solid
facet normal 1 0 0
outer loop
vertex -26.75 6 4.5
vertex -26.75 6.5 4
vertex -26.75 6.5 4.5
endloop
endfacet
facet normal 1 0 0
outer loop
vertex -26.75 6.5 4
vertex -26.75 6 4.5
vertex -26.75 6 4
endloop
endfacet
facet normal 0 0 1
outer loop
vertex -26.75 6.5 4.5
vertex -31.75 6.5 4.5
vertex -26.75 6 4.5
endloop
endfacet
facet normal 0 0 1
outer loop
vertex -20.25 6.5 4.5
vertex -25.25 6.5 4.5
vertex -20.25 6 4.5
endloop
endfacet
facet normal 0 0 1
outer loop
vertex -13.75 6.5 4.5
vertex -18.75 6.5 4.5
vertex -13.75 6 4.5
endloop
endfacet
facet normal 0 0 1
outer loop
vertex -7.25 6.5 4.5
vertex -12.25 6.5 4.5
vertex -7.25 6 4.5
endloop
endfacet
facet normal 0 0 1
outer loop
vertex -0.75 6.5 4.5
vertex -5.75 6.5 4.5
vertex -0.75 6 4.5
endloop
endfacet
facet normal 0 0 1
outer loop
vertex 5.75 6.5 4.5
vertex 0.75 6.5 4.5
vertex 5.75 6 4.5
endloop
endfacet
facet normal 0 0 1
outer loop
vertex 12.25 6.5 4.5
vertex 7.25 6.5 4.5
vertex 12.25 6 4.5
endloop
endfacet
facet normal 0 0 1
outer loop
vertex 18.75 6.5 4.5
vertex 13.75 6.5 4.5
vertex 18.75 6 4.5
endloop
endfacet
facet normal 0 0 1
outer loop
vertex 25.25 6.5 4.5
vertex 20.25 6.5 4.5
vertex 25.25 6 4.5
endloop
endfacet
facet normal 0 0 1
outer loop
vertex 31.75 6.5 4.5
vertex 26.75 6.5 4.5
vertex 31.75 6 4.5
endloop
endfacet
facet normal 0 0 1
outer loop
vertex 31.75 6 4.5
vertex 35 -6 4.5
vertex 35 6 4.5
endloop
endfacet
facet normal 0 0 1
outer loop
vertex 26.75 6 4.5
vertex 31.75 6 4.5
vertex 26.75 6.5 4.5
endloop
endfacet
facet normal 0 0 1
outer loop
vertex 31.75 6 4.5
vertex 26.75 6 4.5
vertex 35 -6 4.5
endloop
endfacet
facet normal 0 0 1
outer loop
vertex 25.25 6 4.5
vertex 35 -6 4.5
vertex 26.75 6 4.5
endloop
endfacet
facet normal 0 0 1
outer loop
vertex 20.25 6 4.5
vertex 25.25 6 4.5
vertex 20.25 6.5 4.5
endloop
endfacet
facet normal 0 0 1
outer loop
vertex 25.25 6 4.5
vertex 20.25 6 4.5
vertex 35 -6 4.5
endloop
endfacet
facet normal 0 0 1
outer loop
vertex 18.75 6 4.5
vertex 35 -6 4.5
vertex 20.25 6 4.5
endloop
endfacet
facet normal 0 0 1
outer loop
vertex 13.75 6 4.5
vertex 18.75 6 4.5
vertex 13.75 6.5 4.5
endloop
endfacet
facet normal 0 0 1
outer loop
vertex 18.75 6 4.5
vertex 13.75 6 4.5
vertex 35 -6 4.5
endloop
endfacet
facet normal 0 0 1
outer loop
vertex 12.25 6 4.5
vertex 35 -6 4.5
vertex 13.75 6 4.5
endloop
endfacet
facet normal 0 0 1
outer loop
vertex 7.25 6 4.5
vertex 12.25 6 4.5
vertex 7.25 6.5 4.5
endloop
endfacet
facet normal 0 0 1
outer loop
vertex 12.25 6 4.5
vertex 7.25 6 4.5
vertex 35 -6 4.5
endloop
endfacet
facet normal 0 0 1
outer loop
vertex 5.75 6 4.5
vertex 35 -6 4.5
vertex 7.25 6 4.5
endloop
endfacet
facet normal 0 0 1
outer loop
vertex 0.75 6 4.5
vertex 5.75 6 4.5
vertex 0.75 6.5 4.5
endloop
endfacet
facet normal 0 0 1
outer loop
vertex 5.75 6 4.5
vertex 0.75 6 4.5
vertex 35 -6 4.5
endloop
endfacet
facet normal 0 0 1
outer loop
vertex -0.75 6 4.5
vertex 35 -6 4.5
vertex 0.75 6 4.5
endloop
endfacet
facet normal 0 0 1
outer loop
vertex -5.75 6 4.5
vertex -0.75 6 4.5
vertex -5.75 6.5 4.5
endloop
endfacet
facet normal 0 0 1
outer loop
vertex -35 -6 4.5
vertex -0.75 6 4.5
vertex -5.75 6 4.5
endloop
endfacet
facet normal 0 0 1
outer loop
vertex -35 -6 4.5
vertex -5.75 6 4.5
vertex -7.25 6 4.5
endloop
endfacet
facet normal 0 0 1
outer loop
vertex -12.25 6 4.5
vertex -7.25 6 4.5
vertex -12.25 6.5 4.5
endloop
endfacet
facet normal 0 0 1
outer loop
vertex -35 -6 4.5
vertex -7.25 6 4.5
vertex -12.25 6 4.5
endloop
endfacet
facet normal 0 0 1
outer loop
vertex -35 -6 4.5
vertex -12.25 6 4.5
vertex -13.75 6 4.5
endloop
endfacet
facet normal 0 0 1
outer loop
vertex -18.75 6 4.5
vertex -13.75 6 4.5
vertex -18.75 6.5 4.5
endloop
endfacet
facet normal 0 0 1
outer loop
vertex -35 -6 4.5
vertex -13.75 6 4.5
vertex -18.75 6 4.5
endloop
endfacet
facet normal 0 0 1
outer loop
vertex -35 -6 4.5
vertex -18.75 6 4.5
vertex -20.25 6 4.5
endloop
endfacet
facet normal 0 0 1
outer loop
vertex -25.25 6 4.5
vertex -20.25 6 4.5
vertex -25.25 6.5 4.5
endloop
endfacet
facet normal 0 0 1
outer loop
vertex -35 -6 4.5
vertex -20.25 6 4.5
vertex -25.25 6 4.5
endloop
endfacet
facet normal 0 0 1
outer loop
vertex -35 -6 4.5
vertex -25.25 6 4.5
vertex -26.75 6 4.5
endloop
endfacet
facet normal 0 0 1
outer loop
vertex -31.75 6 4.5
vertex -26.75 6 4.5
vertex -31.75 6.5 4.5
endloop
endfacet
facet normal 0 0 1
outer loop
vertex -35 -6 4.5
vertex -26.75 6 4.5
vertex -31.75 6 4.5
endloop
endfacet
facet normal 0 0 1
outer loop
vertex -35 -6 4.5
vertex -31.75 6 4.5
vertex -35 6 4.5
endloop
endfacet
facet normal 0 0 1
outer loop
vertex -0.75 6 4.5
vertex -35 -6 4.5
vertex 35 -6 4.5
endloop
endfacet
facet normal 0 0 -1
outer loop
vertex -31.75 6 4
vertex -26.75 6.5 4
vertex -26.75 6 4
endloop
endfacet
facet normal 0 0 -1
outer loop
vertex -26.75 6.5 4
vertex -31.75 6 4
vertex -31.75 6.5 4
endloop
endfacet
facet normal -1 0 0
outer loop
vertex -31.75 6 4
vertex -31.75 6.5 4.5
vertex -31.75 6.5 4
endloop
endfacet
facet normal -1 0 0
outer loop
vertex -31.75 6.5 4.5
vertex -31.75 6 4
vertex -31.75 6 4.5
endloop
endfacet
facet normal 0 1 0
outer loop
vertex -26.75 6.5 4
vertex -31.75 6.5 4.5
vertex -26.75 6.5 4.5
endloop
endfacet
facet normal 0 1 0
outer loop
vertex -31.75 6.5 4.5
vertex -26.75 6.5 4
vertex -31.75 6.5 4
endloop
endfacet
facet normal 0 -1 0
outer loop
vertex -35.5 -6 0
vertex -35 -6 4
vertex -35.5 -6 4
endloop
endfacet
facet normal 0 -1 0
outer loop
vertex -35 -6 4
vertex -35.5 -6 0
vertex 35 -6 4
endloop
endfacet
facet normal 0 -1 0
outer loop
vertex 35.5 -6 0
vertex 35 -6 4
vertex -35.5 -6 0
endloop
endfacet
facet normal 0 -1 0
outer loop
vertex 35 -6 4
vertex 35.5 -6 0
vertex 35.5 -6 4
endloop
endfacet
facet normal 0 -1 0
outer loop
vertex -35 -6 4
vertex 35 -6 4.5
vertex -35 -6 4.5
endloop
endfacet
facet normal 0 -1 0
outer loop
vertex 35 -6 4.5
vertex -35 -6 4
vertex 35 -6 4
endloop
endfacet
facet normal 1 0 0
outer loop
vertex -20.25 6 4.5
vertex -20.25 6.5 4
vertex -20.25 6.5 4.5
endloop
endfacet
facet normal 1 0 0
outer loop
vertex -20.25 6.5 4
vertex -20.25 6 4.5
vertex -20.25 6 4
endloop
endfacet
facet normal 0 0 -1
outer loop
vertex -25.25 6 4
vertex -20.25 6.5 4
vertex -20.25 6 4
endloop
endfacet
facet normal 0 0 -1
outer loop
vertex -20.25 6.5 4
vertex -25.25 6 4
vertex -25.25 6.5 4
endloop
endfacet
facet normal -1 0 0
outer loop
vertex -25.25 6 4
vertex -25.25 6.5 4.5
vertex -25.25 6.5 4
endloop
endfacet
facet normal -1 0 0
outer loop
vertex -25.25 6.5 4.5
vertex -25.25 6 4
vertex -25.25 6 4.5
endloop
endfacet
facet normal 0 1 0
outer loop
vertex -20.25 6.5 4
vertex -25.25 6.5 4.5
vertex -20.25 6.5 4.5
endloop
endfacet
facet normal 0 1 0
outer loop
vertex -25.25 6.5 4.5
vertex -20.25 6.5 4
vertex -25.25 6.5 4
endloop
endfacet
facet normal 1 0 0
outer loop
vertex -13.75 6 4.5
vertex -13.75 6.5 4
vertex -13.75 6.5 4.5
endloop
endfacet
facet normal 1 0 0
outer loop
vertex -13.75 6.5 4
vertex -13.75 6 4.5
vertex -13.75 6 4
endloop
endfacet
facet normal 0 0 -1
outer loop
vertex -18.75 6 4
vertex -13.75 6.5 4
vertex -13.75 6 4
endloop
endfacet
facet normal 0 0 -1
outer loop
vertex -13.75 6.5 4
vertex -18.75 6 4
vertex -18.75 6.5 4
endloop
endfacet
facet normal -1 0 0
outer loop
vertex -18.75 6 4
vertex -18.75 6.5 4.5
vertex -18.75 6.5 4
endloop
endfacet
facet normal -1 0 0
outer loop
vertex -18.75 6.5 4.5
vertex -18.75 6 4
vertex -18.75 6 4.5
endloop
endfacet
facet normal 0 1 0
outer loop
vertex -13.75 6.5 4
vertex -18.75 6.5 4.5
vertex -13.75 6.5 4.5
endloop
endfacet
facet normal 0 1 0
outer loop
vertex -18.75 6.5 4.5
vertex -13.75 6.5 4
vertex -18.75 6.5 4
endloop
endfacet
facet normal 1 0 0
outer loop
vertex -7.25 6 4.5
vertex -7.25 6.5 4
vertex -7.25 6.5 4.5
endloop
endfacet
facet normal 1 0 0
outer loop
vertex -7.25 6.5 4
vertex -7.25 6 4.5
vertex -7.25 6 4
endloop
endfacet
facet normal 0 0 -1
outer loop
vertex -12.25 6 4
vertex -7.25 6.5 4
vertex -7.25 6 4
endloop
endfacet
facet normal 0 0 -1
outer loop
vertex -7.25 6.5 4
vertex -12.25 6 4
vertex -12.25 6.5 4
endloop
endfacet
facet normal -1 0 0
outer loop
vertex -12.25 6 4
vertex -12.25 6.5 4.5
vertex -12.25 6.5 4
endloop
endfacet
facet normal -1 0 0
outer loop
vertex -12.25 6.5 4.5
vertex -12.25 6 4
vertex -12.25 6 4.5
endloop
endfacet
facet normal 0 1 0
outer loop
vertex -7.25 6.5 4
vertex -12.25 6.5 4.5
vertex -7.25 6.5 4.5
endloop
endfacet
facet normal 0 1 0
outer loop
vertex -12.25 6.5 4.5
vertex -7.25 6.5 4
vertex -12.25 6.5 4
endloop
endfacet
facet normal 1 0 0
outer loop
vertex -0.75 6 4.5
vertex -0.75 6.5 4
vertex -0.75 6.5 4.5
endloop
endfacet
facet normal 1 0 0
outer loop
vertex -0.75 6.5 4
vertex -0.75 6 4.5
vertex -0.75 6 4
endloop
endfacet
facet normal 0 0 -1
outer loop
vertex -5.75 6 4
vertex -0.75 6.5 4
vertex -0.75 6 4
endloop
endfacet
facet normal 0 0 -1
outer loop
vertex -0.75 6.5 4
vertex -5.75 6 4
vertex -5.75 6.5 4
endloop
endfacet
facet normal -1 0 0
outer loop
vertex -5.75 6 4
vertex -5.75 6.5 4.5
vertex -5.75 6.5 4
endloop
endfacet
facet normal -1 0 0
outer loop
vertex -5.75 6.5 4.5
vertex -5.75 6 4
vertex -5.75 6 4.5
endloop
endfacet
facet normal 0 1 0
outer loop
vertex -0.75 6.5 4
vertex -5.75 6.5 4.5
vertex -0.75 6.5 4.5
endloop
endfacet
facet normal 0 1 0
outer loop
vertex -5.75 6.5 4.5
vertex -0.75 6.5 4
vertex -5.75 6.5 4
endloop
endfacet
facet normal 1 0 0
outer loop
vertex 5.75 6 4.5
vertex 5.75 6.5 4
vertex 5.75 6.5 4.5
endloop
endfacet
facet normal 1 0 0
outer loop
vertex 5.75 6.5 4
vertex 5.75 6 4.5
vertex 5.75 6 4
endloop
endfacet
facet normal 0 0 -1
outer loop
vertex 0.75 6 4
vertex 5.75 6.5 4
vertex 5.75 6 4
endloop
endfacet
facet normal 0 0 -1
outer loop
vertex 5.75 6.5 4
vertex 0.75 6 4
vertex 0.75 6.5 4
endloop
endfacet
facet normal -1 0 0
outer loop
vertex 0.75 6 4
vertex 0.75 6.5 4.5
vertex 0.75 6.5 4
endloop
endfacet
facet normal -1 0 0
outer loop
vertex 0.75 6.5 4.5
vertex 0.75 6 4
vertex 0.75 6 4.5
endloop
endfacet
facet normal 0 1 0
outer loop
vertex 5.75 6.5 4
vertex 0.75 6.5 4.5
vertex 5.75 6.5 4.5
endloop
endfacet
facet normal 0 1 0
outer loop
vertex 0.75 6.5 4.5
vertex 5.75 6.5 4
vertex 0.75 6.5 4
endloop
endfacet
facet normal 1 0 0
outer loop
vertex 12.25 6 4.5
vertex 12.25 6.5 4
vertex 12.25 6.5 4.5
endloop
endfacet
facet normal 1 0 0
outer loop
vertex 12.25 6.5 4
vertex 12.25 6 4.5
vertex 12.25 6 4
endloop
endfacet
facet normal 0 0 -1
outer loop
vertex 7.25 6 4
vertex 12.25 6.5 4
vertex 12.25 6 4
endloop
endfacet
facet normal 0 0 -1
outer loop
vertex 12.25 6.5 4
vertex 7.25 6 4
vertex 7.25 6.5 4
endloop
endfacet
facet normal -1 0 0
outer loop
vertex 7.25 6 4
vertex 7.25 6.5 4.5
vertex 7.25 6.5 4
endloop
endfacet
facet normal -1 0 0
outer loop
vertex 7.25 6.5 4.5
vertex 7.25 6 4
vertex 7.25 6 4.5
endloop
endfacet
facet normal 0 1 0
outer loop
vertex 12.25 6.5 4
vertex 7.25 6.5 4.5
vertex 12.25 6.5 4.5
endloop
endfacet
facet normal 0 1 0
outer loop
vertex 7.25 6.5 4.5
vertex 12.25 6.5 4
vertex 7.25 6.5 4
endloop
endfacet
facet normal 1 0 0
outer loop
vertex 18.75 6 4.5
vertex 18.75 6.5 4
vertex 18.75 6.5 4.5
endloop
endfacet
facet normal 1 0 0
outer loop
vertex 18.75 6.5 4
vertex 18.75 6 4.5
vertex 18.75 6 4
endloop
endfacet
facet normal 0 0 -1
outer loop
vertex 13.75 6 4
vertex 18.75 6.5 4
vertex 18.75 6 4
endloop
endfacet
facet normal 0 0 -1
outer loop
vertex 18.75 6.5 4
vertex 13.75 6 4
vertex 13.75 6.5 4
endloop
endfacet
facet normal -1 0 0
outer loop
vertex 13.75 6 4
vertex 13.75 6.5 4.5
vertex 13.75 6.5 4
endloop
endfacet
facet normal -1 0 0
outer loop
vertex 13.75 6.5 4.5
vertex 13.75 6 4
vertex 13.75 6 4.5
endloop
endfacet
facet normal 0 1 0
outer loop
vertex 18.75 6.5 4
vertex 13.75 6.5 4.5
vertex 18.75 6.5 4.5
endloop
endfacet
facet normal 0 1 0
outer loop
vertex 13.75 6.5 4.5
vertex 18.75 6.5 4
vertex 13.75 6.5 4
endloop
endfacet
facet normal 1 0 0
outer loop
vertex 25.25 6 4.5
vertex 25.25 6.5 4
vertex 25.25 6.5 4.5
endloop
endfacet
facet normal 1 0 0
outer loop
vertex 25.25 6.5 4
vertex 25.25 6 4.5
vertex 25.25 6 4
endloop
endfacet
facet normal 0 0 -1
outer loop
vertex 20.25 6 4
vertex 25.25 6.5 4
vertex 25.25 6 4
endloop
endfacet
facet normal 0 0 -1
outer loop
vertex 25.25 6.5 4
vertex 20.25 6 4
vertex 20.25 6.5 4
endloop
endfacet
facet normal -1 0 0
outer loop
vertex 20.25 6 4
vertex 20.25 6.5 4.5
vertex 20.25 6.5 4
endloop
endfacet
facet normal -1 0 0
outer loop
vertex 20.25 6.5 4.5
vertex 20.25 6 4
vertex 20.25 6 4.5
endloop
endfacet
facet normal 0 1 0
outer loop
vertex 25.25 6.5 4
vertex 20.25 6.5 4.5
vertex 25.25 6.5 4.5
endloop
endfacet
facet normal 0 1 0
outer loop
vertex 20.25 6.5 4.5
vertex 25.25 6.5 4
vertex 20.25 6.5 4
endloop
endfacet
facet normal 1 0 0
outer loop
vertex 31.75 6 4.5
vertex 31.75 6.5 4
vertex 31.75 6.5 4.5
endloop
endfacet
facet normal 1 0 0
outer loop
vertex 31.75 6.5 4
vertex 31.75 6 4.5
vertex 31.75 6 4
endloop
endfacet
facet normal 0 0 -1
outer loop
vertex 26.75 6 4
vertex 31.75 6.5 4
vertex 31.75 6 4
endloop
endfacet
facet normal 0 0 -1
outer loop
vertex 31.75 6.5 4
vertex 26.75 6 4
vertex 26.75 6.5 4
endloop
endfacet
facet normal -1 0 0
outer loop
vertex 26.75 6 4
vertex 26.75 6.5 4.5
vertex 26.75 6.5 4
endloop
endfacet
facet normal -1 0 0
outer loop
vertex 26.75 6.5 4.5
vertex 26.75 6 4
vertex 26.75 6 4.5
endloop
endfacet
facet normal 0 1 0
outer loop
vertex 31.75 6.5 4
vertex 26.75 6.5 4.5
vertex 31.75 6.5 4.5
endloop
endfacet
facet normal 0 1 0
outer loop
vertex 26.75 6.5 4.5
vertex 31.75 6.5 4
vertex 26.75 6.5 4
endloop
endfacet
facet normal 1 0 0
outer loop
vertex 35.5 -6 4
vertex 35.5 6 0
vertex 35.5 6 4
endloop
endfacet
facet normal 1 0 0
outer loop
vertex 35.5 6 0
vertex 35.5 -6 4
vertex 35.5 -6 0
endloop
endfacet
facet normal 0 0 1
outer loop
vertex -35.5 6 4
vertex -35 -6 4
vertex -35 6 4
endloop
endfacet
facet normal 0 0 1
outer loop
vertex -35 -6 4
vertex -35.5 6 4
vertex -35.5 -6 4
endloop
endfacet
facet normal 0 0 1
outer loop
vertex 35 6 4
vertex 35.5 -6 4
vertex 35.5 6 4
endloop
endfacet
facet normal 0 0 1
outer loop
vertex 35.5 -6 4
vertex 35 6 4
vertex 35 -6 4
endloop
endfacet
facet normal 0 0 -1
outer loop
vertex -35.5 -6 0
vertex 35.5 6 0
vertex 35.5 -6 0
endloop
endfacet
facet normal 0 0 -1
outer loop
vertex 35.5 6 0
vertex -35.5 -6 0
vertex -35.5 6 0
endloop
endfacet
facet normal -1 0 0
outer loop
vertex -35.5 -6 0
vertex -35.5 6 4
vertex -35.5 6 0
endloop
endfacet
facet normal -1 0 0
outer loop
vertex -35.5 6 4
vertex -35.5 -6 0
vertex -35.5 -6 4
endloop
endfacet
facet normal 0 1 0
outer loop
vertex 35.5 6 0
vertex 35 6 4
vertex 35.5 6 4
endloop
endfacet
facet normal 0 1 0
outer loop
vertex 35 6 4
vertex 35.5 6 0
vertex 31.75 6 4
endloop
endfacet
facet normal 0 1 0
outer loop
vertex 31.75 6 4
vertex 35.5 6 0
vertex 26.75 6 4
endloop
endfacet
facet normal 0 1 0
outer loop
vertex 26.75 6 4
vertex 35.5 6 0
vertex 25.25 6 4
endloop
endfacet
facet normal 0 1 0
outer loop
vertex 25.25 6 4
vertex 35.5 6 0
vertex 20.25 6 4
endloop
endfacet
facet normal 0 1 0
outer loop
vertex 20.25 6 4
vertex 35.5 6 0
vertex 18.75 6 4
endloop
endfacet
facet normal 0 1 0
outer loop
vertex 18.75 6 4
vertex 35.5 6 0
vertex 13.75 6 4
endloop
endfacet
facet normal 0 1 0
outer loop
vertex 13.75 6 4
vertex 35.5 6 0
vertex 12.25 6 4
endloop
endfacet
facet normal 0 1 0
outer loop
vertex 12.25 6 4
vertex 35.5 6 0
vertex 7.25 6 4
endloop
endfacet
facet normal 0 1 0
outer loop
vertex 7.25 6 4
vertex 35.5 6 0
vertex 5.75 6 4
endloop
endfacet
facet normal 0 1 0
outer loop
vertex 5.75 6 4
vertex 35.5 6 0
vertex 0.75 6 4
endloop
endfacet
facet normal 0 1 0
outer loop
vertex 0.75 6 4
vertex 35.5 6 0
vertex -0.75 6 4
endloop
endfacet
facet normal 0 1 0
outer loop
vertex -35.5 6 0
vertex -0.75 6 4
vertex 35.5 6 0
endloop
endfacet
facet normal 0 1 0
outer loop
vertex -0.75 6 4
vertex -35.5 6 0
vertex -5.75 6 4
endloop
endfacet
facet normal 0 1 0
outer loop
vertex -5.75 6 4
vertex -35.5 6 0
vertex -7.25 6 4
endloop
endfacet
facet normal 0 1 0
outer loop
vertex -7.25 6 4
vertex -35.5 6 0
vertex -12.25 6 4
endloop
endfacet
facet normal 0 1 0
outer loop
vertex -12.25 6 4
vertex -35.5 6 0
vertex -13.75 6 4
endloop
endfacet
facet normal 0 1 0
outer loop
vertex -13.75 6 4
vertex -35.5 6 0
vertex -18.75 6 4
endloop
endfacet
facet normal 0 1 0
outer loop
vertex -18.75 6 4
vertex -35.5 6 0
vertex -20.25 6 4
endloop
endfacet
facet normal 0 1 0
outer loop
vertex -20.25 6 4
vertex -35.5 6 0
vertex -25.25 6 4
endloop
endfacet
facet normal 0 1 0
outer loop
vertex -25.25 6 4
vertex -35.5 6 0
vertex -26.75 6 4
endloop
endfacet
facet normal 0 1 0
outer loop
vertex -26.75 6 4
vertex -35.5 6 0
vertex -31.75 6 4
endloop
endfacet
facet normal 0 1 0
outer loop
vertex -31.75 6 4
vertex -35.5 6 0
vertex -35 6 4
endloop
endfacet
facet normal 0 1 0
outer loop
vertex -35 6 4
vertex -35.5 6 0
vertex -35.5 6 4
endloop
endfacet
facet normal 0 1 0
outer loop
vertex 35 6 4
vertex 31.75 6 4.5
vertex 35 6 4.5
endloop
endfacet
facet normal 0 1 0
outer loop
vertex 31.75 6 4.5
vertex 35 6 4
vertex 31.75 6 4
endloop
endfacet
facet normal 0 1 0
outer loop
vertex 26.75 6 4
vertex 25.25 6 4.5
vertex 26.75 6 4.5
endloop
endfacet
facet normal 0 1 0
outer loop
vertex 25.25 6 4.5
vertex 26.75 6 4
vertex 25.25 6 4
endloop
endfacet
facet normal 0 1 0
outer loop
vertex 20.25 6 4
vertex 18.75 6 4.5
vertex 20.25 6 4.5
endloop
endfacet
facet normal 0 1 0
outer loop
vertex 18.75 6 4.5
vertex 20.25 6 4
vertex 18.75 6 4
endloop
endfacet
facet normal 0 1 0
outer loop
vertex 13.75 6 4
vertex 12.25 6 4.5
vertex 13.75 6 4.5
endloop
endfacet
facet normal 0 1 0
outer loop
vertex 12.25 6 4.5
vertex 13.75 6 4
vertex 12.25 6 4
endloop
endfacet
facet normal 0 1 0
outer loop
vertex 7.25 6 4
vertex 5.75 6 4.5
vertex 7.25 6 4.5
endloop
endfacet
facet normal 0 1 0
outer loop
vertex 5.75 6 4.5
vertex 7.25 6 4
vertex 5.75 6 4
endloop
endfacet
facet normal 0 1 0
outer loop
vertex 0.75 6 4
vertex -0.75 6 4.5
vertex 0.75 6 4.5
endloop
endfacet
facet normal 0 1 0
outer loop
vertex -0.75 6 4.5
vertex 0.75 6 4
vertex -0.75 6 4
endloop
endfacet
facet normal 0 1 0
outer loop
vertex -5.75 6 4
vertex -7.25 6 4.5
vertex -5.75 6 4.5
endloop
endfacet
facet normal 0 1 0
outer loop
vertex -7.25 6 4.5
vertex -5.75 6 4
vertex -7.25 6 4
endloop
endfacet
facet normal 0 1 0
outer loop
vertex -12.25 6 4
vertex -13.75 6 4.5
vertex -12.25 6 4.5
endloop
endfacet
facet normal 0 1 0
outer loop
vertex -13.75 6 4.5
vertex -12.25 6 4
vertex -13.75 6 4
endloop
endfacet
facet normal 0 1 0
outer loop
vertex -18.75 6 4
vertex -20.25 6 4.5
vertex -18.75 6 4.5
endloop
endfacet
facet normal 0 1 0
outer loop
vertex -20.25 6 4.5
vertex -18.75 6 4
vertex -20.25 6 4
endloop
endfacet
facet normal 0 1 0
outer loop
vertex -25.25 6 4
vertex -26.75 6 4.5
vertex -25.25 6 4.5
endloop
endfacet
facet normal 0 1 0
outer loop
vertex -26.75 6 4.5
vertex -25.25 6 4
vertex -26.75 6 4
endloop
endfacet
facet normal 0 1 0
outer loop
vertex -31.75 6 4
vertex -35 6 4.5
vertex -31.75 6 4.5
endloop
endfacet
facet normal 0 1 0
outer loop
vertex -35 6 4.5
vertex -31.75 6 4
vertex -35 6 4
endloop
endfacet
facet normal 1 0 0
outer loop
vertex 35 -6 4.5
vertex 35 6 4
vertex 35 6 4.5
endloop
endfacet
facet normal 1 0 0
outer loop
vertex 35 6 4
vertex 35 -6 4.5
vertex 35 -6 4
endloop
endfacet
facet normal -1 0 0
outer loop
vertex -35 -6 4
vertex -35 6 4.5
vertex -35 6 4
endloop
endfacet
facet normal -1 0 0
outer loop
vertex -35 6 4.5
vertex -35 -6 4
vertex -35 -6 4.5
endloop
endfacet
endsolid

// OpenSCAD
// 10-well comb for agarose gel casting
// Print orientation: flat on bed, teeth pointing down (-Z)

// ---------- Parameters ----------
plate_thickness = 4;     // mm, base plate thickness
spine_length    = 70;    // mm, spine (back bar) length in X
spine_width     = 12;    // mm, spine width in Y
tooth_count     = 10;    // number of wells
tooth_width     = 5;     // mm, tooth width in X
tooth_length    = 12;    // mm, tooth length in Y
gap             = 1.5;   // mm, gap between neighbouring teeth
overcut         = 0.5;   // mm, extra length on cutters past faces

$fn = 64;

// ---------- Derived ----------
pitch      = tooth_width + gap;
row_offset = -(tooth_count - 1) * pitch / 2;   // centres row on spine in X
spine_x0   = -spine_length / 2;

// ---------- Model ----------
union() {
    // Base plate
    translate([spine_x0 - overcut, -spine_width / 2, 0])
        cube([spine_length + 2 * overcut, spine_width, plate_thickness]);

    // Spine (back bar), extended above top face
    translate([spine_x0, -spine_width / 2, plate_thickness])
        cube([spine_length, spine_width, overcut]);

    // Teeth, hanging from the spine in -Y, overlapping the top face
    for (i = [0 : tooth_count - 1]) {
        translate([row_offset + i * pitch - tooth_width / 2,
                   spine_width / 2 - tooth_length,
                   plate_thickness])
            cube([tooth_width, tooth_length + overcut, overcut]);
    }
}
